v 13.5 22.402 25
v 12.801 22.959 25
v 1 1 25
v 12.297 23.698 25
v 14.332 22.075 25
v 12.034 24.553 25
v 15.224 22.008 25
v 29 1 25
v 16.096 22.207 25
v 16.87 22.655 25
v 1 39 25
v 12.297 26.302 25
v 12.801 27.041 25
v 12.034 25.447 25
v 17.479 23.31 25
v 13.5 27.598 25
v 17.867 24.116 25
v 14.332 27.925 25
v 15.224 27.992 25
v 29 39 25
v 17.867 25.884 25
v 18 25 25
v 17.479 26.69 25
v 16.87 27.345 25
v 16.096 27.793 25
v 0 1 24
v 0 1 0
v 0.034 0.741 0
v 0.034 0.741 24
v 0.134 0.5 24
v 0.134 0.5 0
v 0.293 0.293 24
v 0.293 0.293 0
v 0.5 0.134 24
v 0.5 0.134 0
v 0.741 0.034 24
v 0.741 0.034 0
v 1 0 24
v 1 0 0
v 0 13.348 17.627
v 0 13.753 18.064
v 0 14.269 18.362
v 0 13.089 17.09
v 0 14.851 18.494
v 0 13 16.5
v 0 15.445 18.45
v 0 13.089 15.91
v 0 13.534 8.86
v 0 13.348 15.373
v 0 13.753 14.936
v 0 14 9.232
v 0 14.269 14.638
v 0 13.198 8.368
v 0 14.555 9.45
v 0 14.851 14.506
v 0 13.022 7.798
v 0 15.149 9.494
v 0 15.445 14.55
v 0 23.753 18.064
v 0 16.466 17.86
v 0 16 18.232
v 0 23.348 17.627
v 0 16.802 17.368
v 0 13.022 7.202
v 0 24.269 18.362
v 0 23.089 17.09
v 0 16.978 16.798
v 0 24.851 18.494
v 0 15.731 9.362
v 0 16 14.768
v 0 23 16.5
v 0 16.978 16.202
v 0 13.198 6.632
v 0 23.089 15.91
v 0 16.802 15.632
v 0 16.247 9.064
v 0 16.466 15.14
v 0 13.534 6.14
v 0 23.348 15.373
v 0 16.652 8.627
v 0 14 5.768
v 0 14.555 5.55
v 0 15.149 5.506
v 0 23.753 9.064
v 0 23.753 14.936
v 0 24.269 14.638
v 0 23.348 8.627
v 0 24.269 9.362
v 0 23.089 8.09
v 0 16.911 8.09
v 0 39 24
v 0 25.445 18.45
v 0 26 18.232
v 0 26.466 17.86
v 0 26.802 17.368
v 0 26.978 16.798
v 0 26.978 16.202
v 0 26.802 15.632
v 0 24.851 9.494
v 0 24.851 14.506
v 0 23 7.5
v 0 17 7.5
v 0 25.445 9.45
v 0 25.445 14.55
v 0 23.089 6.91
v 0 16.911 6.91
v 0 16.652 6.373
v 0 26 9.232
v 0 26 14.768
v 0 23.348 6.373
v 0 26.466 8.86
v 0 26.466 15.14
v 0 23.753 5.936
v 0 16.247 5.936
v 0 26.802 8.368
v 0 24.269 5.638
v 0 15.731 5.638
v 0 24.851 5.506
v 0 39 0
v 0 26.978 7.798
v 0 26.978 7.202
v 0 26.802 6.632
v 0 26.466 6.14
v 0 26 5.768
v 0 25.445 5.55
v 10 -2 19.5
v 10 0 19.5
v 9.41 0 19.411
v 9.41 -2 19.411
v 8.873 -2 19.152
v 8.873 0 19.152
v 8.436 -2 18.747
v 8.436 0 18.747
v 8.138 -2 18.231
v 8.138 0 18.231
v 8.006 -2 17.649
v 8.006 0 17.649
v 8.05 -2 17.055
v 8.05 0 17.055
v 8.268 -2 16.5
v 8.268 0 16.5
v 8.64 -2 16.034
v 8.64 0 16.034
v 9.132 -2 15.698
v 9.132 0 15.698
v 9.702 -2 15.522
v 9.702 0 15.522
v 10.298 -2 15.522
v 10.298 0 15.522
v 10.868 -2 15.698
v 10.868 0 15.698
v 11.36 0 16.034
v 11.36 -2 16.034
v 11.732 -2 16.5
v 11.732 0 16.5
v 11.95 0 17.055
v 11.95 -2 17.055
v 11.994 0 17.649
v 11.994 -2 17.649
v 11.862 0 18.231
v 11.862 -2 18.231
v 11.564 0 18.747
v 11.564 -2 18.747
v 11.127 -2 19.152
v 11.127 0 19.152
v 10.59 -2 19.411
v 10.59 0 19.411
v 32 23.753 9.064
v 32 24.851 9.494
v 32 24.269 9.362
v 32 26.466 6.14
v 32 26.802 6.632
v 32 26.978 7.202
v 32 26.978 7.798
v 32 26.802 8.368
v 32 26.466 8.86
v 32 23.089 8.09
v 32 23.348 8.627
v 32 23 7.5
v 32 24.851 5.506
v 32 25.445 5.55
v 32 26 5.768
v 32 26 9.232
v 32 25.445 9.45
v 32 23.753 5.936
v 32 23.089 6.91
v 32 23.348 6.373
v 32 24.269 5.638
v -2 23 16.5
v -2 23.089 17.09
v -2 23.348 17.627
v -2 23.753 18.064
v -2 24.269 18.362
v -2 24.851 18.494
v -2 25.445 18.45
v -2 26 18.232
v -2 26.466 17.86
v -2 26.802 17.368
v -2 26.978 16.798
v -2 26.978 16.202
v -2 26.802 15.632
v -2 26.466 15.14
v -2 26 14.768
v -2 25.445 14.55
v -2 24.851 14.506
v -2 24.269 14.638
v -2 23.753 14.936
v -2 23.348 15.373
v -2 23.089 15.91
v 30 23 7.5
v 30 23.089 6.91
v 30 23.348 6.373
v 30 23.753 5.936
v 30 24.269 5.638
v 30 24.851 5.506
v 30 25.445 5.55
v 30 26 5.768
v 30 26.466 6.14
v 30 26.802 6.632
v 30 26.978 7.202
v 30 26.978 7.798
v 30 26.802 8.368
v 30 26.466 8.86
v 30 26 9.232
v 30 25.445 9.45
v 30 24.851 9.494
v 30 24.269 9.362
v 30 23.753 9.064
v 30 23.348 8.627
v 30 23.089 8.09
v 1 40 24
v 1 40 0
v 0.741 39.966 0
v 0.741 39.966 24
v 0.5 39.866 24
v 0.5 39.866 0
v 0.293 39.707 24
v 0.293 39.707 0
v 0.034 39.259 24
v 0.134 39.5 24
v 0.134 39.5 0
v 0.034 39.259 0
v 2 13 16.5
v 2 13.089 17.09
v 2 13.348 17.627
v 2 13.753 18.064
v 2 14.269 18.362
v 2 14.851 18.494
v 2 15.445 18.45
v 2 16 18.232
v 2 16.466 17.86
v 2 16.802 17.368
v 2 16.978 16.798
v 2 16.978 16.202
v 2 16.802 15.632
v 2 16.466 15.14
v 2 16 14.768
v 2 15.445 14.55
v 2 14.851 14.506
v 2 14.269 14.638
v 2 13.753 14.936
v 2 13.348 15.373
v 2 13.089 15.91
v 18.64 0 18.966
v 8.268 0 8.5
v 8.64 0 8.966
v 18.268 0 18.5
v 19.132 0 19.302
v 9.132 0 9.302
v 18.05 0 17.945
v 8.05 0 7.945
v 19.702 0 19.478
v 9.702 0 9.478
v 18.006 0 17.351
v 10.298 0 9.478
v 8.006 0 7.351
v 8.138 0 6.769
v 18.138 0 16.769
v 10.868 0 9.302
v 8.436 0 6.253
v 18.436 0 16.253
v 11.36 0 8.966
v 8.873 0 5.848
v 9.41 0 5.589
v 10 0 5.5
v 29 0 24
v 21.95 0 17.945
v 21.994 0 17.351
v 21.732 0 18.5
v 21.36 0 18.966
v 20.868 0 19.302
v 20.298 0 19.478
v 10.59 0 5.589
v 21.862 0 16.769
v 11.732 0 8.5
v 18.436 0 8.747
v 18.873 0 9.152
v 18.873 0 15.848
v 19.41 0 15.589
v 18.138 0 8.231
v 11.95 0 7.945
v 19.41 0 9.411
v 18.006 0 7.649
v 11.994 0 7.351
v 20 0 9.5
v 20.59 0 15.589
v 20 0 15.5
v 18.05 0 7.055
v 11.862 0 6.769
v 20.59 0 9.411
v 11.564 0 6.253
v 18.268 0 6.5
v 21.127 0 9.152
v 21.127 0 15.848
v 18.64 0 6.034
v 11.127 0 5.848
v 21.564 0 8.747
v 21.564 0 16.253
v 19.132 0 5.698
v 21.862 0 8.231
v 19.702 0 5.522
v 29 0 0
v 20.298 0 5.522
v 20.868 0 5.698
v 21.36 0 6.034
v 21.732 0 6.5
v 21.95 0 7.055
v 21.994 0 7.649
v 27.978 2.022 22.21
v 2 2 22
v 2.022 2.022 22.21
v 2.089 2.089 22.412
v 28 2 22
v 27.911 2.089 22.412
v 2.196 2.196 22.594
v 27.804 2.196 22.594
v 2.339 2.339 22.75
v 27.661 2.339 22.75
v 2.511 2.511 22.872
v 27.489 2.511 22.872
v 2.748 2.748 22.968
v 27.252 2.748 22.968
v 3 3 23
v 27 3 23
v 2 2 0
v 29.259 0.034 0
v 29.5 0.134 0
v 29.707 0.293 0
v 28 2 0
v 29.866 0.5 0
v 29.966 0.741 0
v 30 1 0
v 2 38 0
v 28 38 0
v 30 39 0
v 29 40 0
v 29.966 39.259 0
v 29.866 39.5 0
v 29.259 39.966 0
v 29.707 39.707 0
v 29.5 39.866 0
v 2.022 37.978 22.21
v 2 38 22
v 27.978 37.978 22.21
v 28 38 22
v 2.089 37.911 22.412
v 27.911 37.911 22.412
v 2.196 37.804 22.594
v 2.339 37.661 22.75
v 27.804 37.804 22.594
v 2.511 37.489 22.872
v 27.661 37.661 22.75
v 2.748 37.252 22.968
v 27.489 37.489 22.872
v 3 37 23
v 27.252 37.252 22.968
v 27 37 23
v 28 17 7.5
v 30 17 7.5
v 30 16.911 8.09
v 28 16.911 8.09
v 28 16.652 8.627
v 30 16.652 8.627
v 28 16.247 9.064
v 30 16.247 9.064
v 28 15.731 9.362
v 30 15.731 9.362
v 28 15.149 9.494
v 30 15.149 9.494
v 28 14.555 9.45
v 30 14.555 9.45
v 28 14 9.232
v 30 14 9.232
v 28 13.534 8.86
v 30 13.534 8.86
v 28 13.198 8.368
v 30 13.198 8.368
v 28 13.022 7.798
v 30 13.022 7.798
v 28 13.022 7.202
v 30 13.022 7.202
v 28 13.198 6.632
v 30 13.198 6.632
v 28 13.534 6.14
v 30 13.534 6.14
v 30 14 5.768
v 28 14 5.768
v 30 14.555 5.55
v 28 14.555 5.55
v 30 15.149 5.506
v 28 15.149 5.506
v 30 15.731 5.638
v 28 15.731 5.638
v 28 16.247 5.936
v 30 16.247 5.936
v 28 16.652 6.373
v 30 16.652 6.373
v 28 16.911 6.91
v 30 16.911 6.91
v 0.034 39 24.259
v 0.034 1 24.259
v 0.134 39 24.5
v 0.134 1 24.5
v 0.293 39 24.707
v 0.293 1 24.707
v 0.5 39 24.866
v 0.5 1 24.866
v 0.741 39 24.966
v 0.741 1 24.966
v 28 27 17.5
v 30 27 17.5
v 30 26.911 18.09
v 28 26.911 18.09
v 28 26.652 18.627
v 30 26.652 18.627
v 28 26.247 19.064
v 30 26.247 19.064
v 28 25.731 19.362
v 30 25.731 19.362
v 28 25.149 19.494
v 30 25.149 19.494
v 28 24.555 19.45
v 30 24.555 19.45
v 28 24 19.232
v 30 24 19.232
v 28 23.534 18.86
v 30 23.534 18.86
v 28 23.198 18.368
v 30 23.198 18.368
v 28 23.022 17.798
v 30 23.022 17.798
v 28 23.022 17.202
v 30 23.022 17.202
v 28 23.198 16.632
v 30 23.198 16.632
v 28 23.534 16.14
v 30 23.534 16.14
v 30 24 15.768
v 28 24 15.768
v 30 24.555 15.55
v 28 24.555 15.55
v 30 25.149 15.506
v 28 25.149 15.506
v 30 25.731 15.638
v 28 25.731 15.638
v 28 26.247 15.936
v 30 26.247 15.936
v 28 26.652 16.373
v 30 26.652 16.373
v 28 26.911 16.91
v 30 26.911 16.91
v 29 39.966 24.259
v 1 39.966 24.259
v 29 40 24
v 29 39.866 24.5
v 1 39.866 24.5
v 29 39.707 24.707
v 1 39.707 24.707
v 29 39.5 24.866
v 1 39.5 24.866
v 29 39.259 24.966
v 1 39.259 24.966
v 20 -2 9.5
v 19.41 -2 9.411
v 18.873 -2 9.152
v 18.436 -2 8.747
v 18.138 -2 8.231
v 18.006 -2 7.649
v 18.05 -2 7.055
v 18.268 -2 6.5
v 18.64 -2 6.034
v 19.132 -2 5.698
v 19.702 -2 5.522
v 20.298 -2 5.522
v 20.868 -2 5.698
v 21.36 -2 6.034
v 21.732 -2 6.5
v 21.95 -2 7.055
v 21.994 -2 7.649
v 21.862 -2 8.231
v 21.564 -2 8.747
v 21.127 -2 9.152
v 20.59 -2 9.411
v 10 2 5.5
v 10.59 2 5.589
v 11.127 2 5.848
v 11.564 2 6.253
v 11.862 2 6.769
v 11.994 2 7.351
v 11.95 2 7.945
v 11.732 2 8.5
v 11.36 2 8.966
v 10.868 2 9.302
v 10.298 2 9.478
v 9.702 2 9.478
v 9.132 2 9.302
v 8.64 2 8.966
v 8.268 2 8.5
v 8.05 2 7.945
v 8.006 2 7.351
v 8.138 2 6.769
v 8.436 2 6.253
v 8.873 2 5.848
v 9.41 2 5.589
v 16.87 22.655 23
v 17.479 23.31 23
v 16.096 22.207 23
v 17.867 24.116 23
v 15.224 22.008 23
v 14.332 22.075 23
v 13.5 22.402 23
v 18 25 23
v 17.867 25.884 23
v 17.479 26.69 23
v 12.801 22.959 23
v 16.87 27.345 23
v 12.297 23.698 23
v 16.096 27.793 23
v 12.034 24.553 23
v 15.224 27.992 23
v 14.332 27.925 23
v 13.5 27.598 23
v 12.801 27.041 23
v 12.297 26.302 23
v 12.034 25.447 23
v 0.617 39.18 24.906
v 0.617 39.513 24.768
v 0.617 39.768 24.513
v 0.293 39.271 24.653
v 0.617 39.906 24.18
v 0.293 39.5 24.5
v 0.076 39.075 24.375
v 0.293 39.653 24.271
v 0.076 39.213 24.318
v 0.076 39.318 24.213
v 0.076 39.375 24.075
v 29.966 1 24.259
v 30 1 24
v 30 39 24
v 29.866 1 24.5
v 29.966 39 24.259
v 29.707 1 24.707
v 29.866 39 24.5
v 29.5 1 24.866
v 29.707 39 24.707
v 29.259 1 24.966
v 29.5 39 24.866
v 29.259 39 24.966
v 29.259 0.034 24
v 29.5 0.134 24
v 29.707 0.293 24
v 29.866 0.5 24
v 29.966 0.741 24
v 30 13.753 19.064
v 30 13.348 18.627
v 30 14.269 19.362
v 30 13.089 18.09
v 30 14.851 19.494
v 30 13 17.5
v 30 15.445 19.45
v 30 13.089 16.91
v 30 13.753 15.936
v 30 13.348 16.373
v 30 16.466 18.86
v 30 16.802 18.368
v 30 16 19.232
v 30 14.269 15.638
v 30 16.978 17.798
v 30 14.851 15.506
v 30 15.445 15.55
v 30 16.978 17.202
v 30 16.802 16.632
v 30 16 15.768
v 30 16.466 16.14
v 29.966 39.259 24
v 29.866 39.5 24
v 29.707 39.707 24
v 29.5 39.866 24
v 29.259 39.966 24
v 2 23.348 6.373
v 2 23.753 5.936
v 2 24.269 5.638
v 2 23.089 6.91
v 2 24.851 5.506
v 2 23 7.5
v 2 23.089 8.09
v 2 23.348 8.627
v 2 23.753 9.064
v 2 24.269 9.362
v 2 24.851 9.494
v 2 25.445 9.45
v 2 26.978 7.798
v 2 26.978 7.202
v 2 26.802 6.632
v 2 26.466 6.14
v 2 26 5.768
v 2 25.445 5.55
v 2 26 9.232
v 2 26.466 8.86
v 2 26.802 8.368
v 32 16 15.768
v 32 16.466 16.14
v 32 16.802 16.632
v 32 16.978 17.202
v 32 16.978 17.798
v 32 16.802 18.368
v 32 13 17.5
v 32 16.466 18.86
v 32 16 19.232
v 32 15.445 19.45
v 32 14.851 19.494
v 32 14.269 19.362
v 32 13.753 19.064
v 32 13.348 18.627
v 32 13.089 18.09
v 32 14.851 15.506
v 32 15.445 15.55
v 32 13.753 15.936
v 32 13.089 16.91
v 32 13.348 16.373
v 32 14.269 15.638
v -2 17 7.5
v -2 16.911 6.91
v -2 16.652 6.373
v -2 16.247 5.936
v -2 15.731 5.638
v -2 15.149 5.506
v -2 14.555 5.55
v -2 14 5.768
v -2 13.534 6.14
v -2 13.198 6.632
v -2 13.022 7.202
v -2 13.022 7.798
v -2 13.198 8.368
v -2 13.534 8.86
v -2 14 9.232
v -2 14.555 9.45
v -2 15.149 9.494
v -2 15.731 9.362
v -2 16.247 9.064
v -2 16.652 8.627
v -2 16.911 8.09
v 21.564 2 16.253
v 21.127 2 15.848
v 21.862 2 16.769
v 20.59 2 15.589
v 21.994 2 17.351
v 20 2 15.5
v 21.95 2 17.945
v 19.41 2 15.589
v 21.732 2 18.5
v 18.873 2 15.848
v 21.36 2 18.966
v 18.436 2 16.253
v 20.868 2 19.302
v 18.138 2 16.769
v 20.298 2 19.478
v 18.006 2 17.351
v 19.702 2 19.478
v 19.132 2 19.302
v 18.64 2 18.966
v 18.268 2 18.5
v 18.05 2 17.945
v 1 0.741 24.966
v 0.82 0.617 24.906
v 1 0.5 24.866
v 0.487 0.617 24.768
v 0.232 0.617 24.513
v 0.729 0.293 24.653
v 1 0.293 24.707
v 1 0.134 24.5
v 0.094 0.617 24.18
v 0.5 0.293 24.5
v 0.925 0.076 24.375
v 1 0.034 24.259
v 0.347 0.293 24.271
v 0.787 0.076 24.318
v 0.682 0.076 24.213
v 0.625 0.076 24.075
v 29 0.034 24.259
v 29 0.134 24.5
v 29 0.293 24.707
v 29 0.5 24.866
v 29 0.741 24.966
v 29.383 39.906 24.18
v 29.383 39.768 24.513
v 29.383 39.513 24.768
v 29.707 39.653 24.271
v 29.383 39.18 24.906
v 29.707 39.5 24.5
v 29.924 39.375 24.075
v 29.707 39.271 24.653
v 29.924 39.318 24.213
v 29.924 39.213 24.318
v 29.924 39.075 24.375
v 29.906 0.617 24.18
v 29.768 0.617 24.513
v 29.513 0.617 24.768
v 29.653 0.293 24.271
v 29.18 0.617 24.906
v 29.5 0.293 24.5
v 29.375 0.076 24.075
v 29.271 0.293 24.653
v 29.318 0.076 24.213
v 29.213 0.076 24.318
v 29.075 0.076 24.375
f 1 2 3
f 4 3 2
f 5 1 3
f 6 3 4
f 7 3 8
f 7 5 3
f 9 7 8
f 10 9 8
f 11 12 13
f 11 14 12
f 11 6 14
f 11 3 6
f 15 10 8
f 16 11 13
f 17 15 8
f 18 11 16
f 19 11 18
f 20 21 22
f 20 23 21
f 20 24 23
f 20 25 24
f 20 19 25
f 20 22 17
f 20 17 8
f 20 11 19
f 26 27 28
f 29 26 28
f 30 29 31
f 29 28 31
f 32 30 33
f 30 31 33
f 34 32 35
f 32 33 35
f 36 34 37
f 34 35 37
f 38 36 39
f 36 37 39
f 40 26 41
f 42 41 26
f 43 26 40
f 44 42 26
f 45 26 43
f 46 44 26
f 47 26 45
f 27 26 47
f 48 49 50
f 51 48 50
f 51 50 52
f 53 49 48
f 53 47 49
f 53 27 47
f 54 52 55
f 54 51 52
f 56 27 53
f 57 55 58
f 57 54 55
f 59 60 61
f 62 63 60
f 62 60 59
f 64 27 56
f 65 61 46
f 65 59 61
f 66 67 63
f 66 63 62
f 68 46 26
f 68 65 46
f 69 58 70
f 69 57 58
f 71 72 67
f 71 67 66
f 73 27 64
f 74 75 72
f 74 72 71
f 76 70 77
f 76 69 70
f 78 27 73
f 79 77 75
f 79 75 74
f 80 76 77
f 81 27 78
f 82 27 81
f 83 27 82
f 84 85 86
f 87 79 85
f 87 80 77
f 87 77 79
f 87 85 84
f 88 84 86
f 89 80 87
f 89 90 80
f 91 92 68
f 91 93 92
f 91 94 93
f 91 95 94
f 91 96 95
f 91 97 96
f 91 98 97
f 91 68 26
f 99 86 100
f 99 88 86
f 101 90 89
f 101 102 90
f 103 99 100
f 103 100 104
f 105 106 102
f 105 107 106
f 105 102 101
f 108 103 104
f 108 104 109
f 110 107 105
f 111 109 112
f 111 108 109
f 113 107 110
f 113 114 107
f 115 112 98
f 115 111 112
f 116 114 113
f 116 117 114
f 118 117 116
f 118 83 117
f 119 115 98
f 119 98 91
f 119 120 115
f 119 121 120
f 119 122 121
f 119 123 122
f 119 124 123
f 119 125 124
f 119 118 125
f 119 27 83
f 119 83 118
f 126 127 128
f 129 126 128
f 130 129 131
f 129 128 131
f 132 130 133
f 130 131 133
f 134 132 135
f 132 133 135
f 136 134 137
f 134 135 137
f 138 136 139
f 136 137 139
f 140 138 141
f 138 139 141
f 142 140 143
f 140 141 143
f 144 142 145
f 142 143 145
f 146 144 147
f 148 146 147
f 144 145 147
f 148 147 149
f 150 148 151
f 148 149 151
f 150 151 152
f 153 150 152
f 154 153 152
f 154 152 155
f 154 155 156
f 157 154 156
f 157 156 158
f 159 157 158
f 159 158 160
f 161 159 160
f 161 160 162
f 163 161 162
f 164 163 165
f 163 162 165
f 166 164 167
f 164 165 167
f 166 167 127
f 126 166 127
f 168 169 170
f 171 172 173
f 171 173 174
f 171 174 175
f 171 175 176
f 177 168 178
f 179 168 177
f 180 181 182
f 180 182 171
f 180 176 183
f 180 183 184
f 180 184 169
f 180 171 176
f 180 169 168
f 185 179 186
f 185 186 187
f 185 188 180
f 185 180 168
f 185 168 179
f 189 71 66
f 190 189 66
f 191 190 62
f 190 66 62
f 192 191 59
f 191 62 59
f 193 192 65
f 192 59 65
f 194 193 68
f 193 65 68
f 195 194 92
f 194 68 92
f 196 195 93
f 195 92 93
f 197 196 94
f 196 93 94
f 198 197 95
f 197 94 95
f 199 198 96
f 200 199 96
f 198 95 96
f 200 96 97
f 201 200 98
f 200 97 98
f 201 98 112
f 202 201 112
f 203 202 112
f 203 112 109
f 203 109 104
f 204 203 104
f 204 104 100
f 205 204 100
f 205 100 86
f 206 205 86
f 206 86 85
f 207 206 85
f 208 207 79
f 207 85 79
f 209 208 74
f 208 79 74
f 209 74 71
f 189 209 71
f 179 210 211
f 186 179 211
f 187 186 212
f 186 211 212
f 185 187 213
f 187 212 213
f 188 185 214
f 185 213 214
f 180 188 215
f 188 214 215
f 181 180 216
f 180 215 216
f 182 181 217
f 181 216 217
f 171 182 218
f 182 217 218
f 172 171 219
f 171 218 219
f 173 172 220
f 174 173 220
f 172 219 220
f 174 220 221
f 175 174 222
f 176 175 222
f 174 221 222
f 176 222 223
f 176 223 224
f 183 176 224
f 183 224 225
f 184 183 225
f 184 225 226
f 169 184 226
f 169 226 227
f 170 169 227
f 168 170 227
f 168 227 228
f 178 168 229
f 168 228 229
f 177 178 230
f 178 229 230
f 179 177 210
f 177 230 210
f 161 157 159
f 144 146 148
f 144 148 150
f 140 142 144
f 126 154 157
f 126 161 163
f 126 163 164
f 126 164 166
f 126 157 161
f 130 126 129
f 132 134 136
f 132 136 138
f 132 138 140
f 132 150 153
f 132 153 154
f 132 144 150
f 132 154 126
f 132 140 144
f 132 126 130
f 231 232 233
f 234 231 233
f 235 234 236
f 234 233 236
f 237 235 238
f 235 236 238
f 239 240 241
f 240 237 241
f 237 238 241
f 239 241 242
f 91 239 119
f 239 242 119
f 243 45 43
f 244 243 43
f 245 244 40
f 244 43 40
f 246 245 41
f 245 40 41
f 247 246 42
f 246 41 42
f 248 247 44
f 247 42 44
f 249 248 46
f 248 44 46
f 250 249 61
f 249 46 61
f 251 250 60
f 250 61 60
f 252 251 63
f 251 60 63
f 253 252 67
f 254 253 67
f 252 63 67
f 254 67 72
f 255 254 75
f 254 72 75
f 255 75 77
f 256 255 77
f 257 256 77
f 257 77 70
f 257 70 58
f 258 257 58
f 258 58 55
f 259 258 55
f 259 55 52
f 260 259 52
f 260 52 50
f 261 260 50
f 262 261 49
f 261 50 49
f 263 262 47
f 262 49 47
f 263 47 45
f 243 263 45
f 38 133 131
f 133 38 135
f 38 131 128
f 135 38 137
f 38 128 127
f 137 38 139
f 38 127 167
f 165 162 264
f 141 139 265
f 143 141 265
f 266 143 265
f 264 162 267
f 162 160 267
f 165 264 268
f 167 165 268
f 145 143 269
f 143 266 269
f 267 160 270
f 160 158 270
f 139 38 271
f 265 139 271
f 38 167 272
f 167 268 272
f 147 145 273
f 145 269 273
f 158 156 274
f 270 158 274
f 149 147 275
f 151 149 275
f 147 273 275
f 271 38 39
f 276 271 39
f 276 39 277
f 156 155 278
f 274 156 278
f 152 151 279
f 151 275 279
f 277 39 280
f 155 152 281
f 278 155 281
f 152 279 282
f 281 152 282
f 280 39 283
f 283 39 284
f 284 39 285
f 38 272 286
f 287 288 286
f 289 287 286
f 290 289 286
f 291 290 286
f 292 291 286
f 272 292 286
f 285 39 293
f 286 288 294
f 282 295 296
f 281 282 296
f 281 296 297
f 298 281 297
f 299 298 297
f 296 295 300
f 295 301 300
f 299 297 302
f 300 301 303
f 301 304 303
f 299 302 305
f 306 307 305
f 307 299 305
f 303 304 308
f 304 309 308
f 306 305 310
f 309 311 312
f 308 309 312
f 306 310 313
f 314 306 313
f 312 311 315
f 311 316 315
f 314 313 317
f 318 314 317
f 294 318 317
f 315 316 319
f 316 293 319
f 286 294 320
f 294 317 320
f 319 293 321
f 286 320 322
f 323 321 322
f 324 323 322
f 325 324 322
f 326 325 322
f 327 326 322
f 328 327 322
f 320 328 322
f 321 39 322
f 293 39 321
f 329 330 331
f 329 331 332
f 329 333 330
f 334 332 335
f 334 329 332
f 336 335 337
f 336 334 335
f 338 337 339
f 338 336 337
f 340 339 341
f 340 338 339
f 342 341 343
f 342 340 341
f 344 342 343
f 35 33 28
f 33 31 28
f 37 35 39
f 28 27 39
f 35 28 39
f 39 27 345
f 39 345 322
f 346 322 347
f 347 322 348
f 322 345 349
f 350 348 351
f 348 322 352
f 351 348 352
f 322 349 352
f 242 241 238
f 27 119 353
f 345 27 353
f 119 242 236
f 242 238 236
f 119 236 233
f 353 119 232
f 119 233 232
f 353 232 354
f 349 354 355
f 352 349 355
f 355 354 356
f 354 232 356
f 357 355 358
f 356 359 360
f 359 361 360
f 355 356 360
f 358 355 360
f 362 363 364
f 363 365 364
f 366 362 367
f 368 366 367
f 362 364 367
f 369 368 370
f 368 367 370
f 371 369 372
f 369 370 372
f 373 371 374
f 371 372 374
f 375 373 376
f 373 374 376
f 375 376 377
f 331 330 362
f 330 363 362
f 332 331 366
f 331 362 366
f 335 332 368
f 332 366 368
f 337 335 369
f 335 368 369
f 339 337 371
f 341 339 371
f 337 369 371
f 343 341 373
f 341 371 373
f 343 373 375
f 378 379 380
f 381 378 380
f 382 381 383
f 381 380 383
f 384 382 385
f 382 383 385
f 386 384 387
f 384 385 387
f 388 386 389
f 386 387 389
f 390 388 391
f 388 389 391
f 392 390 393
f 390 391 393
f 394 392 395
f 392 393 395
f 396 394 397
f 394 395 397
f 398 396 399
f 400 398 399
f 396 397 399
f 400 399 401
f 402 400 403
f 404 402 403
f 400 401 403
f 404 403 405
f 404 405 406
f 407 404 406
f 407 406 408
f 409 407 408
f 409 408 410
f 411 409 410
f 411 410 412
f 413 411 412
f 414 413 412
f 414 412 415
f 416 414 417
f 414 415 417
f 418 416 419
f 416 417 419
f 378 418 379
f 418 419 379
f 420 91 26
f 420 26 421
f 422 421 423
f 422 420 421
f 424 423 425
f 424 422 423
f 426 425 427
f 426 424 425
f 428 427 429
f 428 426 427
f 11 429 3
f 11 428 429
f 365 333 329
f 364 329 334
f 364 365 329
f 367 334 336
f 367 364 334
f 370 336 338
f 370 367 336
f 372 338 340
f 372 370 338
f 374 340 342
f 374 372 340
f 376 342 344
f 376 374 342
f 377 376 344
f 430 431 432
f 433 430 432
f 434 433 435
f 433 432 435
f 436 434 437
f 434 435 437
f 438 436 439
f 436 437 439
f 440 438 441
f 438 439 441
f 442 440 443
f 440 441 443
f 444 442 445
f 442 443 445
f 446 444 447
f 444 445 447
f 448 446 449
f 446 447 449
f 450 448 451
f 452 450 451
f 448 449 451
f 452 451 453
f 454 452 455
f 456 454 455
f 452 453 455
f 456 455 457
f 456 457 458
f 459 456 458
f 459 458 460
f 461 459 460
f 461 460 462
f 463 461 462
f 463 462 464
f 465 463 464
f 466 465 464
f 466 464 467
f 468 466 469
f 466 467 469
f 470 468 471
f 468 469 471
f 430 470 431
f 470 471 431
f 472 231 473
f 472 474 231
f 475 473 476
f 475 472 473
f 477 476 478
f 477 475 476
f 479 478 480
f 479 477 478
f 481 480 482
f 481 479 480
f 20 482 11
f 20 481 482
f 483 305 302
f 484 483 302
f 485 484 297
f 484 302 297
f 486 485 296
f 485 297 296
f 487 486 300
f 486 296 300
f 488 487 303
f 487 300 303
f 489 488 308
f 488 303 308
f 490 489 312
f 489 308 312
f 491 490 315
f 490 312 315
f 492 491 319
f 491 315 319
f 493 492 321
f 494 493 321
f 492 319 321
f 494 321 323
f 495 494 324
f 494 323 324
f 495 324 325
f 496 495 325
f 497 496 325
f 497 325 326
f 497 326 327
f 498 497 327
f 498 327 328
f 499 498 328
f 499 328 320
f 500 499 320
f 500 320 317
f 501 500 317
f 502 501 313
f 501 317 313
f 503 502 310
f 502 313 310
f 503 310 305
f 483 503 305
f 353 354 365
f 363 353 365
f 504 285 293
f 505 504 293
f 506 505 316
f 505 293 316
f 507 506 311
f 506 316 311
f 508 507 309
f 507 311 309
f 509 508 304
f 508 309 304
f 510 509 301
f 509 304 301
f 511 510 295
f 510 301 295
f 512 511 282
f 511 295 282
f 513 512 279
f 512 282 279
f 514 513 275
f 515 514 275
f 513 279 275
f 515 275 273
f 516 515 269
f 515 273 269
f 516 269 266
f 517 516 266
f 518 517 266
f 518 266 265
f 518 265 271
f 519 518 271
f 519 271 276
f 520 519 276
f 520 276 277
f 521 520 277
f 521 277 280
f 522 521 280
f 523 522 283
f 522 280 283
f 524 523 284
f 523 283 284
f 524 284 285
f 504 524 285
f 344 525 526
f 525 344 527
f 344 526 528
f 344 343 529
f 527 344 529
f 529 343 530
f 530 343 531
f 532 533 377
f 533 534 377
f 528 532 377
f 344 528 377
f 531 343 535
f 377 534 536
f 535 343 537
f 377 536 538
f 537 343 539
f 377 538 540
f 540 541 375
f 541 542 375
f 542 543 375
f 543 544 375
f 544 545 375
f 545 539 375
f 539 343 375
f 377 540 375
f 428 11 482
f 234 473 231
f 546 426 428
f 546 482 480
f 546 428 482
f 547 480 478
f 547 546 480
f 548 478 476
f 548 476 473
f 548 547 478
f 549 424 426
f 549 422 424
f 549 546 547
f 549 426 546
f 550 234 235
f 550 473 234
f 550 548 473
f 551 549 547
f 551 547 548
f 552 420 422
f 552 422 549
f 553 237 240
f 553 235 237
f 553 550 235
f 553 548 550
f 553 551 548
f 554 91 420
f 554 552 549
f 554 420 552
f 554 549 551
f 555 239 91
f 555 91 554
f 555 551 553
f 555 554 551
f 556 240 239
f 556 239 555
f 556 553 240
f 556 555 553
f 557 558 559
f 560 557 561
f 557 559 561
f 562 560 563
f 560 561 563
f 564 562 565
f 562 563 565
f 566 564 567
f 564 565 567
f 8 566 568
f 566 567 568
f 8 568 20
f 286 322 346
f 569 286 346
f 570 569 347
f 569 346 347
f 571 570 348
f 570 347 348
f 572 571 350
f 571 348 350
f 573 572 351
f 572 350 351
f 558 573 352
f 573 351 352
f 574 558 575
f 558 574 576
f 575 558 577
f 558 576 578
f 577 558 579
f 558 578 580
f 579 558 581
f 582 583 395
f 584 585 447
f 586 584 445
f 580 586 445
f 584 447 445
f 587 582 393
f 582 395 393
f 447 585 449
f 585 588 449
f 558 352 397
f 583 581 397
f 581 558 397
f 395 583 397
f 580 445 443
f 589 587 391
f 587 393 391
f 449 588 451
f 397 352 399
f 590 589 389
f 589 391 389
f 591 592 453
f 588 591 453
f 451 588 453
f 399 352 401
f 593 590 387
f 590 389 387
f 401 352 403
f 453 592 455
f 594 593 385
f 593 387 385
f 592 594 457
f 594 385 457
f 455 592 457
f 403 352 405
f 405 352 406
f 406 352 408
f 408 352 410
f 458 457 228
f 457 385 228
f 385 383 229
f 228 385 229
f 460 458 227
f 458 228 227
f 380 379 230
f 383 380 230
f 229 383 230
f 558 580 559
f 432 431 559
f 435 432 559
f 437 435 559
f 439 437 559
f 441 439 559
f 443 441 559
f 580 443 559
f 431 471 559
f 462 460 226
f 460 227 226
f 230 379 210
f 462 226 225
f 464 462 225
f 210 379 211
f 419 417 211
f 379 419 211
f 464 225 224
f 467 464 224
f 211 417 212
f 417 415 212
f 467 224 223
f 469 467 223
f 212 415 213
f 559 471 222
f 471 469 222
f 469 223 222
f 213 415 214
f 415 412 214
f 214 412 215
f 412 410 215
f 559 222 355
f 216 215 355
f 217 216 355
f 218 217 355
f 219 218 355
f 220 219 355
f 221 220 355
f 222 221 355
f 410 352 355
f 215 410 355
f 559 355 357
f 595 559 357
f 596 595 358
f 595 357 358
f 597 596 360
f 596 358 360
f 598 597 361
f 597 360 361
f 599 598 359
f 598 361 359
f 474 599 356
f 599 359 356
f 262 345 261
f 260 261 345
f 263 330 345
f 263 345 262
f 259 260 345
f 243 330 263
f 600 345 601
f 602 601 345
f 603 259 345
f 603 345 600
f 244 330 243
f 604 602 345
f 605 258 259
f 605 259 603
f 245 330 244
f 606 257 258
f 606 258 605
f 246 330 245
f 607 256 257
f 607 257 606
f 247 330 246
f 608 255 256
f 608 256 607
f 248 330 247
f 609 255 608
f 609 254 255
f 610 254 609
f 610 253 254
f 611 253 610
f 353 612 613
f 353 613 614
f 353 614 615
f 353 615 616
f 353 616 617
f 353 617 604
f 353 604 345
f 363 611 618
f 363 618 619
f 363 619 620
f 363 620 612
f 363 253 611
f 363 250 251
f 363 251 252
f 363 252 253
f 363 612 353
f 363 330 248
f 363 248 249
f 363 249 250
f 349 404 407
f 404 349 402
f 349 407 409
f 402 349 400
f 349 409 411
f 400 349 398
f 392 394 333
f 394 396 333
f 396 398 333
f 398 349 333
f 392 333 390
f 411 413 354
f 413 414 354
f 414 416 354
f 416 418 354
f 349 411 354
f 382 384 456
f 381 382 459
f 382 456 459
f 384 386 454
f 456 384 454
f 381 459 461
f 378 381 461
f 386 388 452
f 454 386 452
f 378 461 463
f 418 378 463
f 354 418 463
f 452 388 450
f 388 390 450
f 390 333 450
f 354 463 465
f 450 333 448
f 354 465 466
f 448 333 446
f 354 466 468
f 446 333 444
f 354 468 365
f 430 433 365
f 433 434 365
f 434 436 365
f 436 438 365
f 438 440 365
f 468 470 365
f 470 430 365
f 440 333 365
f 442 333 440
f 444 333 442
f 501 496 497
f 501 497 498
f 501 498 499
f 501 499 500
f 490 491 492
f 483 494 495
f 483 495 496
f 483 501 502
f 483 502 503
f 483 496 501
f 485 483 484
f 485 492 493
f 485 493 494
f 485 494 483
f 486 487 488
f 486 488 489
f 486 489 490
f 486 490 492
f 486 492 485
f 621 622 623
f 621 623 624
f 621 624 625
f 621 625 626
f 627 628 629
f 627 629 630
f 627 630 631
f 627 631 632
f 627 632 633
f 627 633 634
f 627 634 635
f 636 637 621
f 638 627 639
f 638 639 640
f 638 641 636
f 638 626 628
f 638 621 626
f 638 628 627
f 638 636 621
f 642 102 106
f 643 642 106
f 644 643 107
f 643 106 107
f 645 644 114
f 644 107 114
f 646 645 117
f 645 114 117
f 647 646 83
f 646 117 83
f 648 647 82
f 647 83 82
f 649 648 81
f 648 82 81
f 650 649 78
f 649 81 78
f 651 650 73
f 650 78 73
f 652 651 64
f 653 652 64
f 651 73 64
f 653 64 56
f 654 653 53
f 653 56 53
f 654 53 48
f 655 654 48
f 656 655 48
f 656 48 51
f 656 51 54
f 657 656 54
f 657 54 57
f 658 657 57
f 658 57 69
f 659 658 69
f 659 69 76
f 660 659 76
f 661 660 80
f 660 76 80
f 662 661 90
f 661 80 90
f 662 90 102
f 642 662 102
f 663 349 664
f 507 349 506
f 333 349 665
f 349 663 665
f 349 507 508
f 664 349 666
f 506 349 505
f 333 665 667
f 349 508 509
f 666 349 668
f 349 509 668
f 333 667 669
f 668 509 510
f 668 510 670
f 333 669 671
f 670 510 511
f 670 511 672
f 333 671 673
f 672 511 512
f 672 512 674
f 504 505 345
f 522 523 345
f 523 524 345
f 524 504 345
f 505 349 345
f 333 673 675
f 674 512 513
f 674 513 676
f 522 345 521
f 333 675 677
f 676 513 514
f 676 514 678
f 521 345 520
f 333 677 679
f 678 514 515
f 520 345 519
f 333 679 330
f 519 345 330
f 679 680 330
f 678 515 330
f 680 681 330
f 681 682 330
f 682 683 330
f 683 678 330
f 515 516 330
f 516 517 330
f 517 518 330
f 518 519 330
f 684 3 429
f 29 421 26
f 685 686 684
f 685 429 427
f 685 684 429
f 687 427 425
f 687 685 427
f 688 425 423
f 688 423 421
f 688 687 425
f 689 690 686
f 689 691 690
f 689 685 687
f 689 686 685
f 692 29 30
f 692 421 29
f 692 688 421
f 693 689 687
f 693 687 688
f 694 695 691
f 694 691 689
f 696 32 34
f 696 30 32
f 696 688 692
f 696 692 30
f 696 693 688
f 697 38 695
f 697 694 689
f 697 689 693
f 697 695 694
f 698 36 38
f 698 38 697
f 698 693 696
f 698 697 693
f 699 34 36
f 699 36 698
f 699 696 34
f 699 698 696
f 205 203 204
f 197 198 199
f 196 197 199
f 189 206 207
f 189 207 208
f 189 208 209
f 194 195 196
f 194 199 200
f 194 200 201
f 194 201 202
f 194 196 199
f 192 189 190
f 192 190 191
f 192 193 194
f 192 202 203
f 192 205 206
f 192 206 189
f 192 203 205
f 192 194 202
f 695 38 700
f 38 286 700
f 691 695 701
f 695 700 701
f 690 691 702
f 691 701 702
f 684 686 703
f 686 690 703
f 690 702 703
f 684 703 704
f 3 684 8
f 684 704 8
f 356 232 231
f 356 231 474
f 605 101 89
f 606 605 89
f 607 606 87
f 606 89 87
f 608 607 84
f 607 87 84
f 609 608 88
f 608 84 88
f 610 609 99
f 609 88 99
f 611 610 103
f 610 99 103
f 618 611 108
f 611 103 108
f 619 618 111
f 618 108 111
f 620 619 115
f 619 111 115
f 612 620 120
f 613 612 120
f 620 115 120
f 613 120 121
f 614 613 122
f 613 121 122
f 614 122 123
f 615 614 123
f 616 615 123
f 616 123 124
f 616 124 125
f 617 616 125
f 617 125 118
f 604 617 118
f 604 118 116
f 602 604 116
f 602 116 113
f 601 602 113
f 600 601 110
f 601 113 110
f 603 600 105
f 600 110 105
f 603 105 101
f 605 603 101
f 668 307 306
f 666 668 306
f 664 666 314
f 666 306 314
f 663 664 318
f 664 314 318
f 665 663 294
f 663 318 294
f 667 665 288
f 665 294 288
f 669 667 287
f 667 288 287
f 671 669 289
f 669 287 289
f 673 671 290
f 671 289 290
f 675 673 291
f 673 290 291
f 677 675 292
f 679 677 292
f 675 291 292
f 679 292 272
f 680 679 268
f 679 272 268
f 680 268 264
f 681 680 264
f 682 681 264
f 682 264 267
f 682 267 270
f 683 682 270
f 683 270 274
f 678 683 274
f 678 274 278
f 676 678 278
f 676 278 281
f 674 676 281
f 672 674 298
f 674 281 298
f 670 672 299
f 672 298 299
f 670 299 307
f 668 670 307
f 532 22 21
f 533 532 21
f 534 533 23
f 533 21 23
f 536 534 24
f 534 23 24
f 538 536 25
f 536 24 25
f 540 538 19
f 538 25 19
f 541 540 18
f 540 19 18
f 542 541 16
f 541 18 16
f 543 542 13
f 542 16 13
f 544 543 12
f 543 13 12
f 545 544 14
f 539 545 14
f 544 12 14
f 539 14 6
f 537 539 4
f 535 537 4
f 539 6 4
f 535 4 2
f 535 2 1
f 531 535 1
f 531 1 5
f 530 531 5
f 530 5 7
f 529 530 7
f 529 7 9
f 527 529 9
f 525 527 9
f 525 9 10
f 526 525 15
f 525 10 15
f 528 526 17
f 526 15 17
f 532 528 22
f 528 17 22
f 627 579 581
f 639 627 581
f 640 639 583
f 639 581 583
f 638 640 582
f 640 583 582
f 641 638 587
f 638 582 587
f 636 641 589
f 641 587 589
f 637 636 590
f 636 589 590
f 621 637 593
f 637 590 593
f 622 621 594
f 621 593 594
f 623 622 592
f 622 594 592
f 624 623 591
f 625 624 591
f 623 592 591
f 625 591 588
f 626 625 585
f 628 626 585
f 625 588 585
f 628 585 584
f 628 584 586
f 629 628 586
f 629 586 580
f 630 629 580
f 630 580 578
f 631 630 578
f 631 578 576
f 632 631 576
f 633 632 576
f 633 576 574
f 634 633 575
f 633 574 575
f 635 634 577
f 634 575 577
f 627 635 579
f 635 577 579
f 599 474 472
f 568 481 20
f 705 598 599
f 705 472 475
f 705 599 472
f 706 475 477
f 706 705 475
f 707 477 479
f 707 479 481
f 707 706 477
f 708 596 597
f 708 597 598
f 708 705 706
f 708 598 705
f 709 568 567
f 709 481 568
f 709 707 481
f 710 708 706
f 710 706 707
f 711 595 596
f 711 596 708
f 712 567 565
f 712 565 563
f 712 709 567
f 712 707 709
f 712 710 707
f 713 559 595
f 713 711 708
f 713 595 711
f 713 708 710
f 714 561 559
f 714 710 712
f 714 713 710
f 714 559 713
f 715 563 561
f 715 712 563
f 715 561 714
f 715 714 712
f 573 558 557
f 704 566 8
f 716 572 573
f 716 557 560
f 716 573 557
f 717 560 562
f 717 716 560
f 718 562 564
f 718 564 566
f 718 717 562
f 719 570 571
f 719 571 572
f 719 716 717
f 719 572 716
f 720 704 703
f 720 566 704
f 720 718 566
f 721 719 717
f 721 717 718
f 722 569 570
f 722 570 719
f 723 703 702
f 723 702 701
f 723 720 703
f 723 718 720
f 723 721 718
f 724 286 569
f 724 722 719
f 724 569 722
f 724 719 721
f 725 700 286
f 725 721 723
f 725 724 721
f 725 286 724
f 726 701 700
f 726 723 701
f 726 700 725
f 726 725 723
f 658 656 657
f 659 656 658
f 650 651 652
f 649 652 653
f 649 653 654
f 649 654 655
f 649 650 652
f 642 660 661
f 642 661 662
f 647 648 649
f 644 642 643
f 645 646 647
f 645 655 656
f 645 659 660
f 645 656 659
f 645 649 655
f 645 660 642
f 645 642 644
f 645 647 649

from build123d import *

# Parameters (mm, degrees)
SKETCH2_W           = 30
SKETCH2_H           = 40
BOSS_EXTRUDE2_DEPTH = 25
FILLET2_R           = 1
FILLET3_R           = 1
SHELL1_START        = 2
SHELL1_OUTLINE_W    = 36
SHELL1_OUTLINE_H    = 23
SHELL1_DEPTH        = 26
FILLET4_R           = 1
SKETCH5_R           = 2
CUT_EXTRUDE10_DEPTH = 2
SKETCH7_R           = 2
BOSS_EXTRUDE3_DEPTH = 2
SKETCH4_R           = 3
CUT_EXTRUDE11_DEPTH = 2
SKETCH8_R           = 2
BOSS_EXTRUDE5_DEPTH = 2
SKETCH9_R           = 2
CUT_EXTRUDE12_DEPTH = 2
SKETCH10_R          = 2
CUT_EXTRUDE13_DEPTH = 2
SKETCH11_R          = 2
BOSS_EXTRUDE6_DEPTH = 2


# Read off the part's stored shape, not the designer's step: Shell1
with BuildPart() as part:
    # Sketch2 → Boss-Extrude2 (new body)
    with BuildSketch(Plane.XY):
        with Locations((15, 20)):
            Rectangle(SKETCH2_W, SKETCH2_H)
    extrude(amount=BOSS_EXTRUDE2_DEPTH)

    # Fillet2
    fillet2_edges = [part.edges().sort_by_distance(p)[0] for p in [
        (30, 20, 25),
        (15, 0, 25),
        (0, 20, 25),
        (15, 40, 25),
    ]]
    fillet(fillet2_edges, radius=FILLET2_R)

    # Fillet3
    # the kernel refuses this fillet: 1 mm, written as the material it takes off along each edge
    with BuildSketch(Plane(origin=(1, 39, 24), x_dir=(0, 1, 0), z_dir=(-1, 0, 0))) as fillet3_piece_1_section:
        Polygon((0, 0), (FILLET3_R, 0), (FILLET3_R, -FILLET3_R), (0, -FILLET3_R), align=None)
    fillet3_piece_1 = extrude(amount=FILLET3_R, mode=Mode.PRIVATE)
    fillet3_piece_1 = fillet3_piece_1 - Plane(origin=(1, 39, 24), x_dir=(0, -0.7071067811865475, -0.7071067811865475), z_dir=(-1, 0, 0)) * Sphere(FILLET3_R, mode=Mode.PRIVATE)
    add(fillet3_piece_1, mode=Mode.SUBTRACT)
    with BuildSketch(Plane(origin=(29, 39, 24), x_dir=(0, 1, 0), z_dir=(1, 0, 0))) as fillet3_piece_2_section:
        Polygon((0, 0), (FILLET3_R, 0), (FILLET3_R, FILLET3_R), (0, FILLET3_R), align=None)
    fillet3_piece_2 = extrude(amount=FILLET3_R, mode=Mode.PRIVATE)
    fillet3_piece_2 = fillet3_piece_2 - Plane(origin=(29, 39, 24), x_dir=(0, -0.7071067811865475, -0.7071067811865475), z_dir=(1, 0, 0)) * Sphere(FILLET3_R, mode=Mode.PRIVATE)
    add(fillet3_piece_2, mode=Mode.SUBTRACT)
    with BuildSketch(Plane(origin=(1, 1, 24), x_dir=(-1, 0, 0), z_dir=(0, -1, 0))) as fillet3_piece_3_section:
        Polygon((0, 0), (FILLET3_R, 0), (FILLET3_R, -FILLET3_R), (0, -FILLET3_R), align=None)
    fillet3_piece_3 = extrude(amount=FILLET3_R, mode=Mode.PRIVATE)
    fillet3_piece_3 = fillet3_piece_3 - Plane(origin=(1, 1, 24), x_dir=(0.7071067811865475, 0, -0.7071067811865475), z_dir=(0, -1, 0)) * Sphere(FILLET3_R, mode=Mode.PRIVATE)
    add(fillet3_piece_3, mode=Mode.SUBTRACT)
    with BuildSketch(Plane(origin=(29, 1, 24), x_dir=(1, 0, 0), z_dir=(0, -1, 0))) as fillet3_piece_4_section:
        Polygon((0, 0), (FILLET3_R, 0), (FILLET3_R, FILLET3_R), (0, FILLET3_R), align=None)
    fillet3_piece_4 = extrude(amount=FILLET3_R, mode=Mode.PRIVATE)
    fillet3_piece_4 = fillet3_piece_4 - Plane(origin=(29, 1, 24), x_dir=(-0.7071067811865475, 0, -0.7071067811865475), z_dir=(0, -1, 0)) * Sphere(FILLET3_R, mode=Mode.PRIVATE)
    add(fillet3_piece_4, mode=Mode.SUBTRACT)
    with BuildSketch(Plane(origin=(30, 0, -2.5), x_dir=(-1, 0, 0), z_dir=(0, 0, 1)), Plane(origin=(30, 40, -2.5), x_dir=(0, -1, 0), z_dir=(0, 0, 1))) as fillet3_piece_5:
        with BuildLine():
            CenterArc((FILLET3_R, -FILLET3_R), FILLET3_R, 90, 90)
            Line((0, -FILLET3_R), (0, 0))
            Line((0, 0), (FILLET3_R, 0))
        make_face()
    extrude(amount=26.5, mode=Mode.SUBTRACT)
    with BuildSketch(Plane(origin=(0, 0, -2.5), x_dir=(1, 0, 0), z_dir=(0, 0, 1)), Plane(origin=(0, 40, -2.5), x_dir=(0, -1, 0), z_dir=(0, 0, 1))) as fillet3_piece_6:
        with BuildLine():
            CenterArc((FILLET3_R, FILLET3_R), FILLET3_R, 180, 90)
            Line((0, FILLET3_R), (0, 0))
            Line((0, 0), (FILLET3_R, 0))
        make_face()
    extrude(amount=26.5, mode=Mode.SUBTRACT)

    # Shell1 outline → Shell1 (cut)
    with BuildSketch(Plane.YZ.offset(SHELL1_START)):
        with Locations((20, 11.5)):
            Rectangle(SHELL1_OUTLINE_W, SHELL1_OUTLINE_H)
    extrude(amount=SHELL1_DEPTH, mode=Mode.SUBTRACT)

    # Fillet4
    fillet4_edges = [part.edges().sort_by_distance(p)[0] for p in [
        (28, 20, 23),
        (2, 20, 23),
        (15, 2, 23),
        (15, 38, 23),
    ]]
    fillet(fillet4_edges, radius=FILLET4_R)

    # Sketch5 → Cut-Extrude10 (cut)
    with BuildSketch(Plane.XZ):
        with Locations(Location((20, 17.5, 0), (0, 0, 270))):
            Circle(SKETCH5_R)
        with Locations(Location((10, 7.5, 0), (0, 0, 270))):
            Circle(SKETCH5_R)
    extrude(amount=-CUT_EXTRUDE10_DEPTH, mode=Mode.SUBTRACT)

    # Sketch7 → Boss-Extrude3 (add)
    with BuildSketch(Plane(origin=(0, 0, 0), x_dir=(-1, 0, 0), z_dir=(0, -1, 0))):
        with Locations(Location((-10, -17.5, 0), (0, 0, 270))):
            Circle(SKETCH7_R)
        with Locations(Location((-20, -7.5, 0), (0, 0, 270))):
            Circle(SKETCH7_R)
    extrude(amount=BOSS_EXTRUDE3_DEPTH)

    # Sketch4 → Cut-Extrude11 (cut)
    with BuildSketch(Plane.XY.offset(25)):
        with Locations((15, 25)):
            Circle(SKETCH4_R)
    extrude(amount=-CUT_EXTRUDE11_DEPTH, mode=Mode.SUBTRACT)

    # Sketch8 → Boss-Extrude5 (add)
    with BuildSketch(Plane(origin=(30, 0, 0), x_dir=(0, 0, -1), z_dir=(1, 0, 0))):
        with Locations(Location((-7.5, 25, 0), (0, 0, 270))):
            Circle(SKETCH8_R)
        with Locations(Location((-17.5, 15, 0), (0, 0, 270))):
            Circle(SKETCH8_R)
    extrude(amount=BOSS_EXTRUDE5_DEPTH)

    # Sketch9 → Cut-Extrude12 (cut)
    with BuildSketch(Plane(origin=(30, 0, 0), x_dir=(0, 0, -1), z_dir=(1, 0, 0))):
        with Locations(Location((-7.5, 15, 0), (0, 0, 90))):
            Circle(SKETCH9_R)
        with Locations(Location((-17.5, 25, 0), (0, 0, 90))):
            Circle(SKETCH9_R)
    extrude(amount=-CUT_EXTRUDE12_DEPTH, mode=Mode.SUBTRACT)

    # Sketch10 → Cut-Extrude13 (cut)
    with BuildSketch(Plane.ZY):
        with Locations(Location((7.5, 25, 0), (0, 0, 270))):
            Circle(SKETCH10_R)
        with Locations(Location((16.5, 15, 0), (0, 0, 270))):
            Circle(SKETCH10_R)
    extrude(amount=-CUT_EXTRUDE13_DEPTH, mode=Mode.SUBTRACT)

    # Sketch11 → Boss-Extrude6 (add)
    with BuildSketch(Plane.ZY):
        with Locations(Location((16.5, 25, 0), (0, 0, 270))):
            Circle(SKETCH11_R)
        with Locations(Location((7.5, 15, 0), (0, 0, 90))):
            Circle(SKETCH11_R)
    extrude(amount=BOSS_EXTRUDE6_DEPTH)


solid = part.part
